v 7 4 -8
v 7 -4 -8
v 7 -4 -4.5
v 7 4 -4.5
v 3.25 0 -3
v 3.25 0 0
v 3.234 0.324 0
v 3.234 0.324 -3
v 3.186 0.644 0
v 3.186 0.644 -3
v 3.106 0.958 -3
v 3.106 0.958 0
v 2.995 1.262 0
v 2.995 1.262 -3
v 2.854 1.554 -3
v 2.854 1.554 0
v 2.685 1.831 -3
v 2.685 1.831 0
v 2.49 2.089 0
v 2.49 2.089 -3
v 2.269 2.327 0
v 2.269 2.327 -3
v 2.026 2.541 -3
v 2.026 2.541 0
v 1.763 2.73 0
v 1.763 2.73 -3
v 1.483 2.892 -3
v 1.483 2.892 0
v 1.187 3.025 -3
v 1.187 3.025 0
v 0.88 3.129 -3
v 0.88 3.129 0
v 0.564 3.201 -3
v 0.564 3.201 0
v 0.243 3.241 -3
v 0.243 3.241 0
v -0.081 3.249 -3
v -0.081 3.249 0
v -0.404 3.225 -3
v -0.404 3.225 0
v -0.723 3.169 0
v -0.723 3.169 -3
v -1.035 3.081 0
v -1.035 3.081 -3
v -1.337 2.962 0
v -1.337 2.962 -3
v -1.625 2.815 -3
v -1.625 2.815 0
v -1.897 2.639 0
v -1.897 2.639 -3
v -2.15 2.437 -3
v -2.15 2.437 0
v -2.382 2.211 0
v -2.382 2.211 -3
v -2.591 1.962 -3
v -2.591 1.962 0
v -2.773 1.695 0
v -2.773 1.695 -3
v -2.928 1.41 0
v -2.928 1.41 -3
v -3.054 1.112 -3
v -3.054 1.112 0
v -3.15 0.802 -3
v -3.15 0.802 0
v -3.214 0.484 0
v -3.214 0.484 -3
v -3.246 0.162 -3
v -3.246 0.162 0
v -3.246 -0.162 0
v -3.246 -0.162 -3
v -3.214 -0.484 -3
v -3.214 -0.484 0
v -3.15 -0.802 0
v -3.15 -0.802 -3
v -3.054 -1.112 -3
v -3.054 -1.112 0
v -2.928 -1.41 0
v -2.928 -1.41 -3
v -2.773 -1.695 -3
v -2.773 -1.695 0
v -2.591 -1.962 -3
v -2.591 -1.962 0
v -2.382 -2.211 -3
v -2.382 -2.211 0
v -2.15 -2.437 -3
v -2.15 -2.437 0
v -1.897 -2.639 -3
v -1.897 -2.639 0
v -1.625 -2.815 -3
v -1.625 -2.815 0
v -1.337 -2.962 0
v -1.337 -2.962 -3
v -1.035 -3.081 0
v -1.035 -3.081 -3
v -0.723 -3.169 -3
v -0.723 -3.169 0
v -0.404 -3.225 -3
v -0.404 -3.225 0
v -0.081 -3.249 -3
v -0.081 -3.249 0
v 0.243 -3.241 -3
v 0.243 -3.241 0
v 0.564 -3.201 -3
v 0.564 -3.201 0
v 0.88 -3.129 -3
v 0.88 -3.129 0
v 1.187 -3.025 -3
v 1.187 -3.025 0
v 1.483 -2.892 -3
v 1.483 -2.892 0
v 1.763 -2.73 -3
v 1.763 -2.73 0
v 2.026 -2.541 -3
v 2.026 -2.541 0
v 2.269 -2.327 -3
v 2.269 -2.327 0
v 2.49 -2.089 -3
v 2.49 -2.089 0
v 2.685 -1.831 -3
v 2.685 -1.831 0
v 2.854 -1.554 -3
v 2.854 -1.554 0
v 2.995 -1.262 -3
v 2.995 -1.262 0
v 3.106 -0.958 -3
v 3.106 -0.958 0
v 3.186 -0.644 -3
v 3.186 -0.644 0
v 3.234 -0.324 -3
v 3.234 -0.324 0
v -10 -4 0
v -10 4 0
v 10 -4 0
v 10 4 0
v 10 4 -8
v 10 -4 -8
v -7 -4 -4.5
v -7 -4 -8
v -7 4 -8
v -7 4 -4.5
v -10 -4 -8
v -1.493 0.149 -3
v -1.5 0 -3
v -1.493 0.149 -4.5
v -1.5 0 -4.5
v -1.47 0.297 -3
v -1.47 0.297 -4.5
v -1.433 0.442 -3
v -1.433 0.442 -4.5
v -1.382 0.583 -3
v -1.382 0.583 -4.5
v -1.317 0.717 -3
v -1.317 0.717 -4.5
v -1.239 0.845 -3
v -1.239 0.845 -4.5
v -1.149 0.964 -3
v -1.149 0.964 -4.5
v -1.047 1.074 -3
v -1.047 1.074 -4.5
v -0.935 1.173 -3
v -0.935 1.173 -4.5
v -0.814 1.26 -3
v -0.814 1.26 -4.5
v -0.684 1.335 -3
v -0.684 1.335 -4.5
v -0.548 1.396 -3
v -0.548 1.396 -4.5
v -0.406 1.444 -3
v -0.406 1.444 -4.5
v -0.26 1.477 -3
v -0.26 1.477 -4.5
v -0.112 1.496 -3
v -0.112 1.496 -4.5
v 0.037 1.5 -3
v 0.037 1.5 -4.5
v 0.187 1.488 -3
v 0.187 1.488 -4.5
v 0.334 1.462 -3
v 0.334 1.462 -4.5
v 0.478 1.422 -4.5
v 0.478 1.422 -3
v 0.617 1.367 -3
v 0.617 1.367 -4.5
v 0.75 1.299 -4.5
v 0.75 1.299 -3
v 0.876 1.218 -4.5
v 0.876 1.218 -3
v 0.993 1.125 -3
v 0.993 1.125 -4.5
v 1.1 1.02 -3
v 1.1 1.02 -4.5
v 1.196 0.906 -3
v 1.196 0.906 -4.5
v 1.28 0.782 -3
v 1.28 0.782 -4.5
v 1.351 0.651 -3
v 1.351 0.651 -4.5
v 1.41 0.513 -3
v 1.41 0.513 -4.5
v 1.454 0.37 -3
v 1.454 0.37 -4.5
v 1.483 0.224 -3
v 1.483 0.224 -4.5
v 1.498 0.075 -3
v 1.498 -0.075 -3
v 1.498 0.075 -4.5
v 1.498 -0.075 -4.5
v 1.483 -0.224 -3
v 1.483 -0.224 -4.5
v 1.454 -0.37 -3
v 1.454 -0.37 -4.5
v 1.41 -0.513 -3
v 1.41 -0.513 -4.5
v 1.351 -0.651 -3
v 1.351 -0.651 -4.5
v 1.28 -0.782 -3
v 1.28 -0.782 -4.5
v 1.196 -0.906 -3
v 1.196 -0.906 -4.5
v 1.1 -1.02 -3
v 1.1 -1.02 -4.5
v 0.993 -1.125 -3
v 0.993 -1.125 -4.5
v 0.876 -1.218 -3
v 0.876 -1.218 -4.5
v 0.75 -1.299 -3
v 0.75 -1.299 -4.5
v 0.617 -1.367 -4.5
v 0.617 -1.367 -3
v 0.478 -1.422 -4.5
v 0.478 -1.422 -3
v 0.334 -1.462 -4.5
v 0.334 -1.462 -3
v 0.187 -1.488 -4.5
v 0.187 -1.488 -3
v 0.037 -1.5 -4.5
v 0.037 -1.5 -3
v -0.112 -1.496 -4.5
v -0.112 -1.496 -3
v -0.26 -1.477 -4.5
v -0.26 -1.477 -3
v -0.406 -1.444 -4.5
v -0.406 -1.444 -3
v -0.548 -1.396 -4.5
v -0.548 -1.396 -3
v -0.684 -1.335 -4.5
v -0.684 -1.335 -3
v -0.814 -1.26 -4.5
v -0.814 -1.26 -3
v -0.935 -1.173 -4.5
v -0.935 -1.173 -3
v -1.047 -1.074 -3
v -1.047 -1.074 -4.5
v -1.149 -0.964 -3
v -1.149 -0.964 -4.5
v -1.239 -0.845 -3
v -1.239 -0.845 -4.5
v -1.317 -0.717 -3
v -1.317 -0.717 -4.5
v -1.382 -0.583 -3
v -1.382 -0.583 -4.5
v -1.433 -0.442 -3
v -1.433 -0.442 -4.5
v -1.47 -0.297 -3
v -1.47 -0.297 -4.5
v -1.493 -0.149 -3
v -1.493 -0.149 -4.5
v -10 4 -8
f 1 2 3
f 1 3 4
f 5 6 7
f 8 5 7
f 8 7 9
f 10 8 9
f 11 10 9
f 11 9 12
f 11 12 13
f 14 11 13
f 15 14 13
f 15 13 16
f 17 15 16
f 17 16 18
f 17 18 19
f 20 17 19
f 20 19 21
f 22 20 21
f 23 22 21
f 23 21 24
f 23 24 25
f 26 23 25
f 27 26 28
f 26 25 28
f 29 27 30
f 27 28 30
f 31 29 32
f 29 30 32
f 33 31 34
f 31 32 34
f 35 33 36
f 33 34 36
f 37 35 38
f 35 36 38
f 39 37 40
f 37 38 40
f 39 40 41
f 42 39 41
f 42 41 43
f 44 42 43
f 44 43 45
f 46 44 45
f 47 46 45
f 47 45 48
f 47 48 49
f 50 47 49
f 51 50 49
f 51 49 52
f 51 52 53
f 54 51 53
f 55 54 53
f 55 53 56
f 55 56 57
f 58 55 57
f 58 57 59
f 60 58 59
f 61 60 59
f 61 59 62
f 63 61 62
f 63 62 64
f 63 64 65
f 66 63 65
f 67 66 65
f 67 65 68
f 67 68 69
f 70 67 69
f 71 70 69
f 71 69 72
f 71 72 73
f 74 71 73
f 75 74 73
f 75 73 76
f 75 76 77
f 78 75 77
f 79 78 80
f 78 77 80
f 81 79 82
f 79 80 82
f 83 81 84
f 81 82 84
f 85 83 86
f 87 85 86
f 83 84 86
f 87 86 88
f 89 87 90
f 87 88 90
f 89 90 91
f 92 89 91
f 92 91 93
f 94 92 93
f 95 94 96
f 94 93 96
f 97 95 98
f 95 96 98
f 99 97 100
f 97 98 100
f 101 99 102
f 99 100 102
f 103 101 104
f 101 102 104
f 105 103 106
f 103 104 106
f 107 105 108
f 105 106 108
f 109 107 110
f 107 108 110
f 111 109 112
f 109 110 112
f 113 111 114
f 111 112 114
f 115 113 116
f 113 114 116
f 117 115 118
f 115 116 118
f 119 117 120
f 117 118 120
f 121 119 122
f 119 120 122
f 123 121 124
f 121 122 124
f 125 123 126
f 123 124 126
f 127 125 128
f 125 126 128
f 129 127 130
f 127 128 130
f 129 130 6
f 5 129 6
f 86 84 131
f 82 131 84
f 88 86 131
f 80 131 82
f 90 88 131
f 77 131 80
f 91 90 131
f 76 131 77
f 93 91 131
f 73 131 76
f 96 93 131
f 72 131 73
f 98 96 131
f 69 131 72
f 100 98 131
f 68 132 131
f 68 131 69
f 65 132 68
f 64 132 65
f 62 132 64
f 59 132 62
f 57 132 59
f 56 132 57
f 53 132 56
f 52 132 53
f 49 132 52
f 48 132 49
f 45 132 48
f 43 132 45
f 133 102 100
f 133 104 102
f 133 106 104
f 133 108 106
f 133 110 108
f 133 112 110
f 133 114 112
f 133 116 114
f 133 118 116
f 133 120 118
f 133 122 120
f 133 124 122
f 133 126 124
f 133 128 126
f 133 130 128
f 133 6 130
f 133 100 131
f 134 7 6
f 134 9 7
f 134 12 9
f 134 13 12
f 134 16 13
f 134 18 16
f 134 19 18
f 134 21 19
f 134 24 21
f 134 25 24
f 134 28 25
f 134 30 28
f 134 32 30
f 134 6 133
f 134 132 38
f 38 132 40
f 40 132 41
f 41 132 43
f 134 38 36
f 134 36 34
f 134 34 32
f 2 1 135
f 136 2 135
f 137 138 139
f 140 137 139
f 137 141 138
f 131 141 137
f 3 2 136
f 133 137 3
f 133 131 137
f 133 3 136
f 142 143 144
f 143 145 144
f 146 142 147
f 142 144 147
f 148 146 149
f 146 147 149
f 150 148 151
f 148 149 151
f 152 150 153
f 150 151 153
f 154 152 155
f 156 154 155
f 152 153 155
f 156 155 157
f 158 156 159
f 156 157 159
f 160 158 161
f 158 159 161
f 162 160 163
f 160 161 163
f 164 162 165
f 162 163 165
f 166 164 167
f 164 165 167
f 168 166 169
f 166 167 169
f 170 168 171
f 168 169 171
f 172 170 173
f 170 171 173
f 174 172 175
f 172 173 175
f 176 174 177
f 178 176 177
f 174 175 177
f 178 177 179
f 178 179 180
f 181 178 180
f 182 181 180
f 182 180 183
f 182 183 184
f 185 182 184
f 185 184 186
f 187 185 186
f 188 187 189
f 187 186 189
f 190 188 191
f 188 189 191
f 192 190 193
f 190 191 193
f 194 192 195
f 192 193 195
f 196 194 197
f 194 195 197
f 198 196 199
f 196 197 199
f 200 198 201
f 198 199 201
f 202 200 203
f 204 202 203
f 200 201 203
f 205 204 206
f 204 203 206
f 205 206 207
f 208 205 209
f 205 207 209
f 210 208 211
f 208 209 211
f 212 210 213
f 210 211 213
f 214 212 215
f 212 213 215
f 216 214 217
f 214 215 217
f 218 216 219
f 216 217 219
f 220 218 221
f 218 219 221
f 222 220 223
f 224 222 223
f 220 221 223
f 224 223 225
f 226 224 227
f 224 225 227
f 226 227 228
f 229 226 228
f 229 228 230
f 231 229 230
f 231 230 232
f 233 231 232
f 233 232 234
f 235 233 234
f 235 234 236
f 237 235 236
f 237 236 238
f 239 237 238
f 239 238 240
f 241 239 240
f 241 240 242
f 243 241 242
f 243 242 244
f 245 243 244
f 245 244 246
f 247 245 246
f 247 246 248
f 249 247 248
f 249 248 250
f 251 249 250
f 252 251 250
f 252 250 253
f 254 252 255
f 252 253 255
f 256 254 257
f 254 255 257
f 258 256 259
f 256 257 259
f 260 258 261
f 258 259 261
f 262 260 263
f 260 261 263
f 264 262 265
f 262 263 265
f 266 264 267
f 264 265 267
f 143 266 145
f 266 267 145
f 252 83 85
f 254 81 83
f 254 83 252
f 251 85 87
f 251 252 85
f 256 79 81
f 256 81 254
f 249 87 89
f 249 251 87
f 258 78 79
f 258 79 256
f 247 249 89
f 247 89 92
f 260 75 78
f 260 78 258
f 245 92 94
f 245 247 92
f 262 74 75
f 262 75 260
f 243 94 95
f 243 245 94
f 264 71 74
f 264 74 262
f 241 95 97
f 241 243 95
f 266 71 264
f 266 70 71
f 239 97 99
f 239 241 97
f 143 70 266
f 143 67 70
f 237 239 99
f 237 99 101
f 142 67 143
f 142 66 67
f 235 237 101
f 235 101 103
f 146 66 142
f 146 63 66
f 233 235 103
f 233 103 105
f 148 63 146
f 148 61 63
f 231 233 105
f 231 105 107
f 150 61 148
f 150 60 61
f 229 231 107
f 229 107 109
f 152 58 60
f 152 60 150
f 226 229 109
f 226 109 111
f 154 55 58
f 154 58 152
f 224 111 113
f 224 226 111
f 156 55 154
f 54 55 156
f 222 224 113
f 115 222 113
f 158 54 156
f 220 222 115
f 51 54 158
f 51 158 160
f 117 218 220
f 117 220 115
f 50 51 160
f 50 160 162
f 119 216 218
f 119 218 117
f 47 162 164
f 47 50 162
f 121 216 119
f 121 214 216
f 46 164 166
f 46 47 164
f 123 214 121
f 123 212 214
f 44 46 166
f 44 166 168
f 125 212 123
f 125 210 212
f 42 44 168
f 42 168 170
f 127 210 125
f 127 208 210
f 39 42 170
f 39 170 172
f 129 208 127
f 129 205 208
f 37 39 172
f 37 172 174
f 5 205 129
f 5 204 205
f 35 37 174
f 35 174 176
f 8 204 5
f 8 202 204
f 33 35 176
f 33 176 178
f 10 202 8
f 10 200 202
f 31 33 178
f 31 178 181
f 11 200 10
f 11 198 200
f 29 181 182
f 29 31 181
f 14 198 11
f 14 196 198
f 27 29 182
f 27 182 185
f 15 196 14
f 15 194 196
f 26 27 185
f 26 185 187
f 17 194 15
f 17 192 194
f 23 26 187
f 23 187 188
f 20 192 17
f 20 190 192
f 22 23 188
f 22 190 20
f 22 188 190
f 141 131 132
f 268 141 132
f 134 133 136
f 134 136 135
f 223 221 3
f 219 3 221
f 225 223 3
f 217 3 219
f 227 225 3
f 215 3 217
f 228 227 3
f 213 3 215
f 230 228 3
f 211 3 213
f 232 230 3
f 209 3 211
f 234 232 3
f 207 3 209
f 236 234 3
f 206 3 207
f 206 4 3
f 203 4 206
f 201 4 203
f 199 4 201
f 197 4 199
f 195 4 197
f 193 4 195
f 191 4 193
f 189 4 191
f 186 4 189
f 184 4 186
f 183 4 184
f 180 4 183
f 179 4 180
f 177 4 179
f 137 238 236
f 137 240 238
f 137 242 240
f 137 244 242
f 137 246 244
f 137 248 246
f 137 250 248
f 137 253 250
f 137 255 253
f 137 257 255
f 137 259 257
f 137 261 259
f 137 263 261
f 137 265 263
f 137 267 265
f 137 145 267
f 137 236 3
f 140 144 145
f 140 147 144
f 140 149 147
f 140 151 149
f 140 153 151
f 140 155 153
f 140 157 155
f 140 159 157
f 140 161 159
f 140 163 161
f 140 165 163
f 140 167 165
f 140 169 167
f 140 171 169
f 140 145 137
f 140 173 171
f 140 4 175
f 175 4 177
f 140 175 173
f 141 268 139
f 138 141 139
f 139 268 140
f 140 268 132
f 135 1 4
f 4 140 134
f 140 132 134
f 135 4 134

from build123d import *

# Parameters (mm, degrees)
SKETCH1_W                               = 20
SKETCH1_H                               = 8
EXTRUDE1_DEPTH                          = 8
SKETCH2_W                               = 14
SKETCH2_H                               = 8
EXTRUDE2_DEPTH                          = 3.5
CBORE_FOR_M5_HEX_HEAD_BOLT1_D           = 3
CBORE_FOR_M5_HEX_HEAD_BOLT1_CBORE_D     = 6.5
CBORE_FOR_M5_HEX_HEAD_BOLT1_CBORE_DEPTH = 3


with BuildPart() as part:
    # Sketch1 → Extrude1 (new body)
    with BuildSketch(Plane.XY):
        Rectangle(SKETCH1_W, SKETCH1_H)
    extrude(amount=-EXTRUDE1_DEPTH)

    # Sketch2 → Extrude2 (cut)
    with BuildSketch(Plane(origin=(0, 0, -8), x_dir=(-1, 0, 0), z_dir=(0, 0, -1))):
        Rectangle(SKETCH2_W, SKETCH2_H)
    extrude(amount=-EXTRUDE2_DEPTH, mode=Mode.SUBTRACT)

    # CBORE for M5 Hex Head Bolt1 (through all)
    with Locations(Plane.XY):
        with Locations((0, 0)):
            CounterBoreHole(CBORE_FOR_M5_HEX_HEAD_BOLT1_D / 2, CBORE_FOR_M5_HEX_HEAD_BOLT1_CBORE_D / 2, CBORE_FOR_M5_HEX_HEAD_BOLT1_CBORE_DEPTH)


solid = part.part
